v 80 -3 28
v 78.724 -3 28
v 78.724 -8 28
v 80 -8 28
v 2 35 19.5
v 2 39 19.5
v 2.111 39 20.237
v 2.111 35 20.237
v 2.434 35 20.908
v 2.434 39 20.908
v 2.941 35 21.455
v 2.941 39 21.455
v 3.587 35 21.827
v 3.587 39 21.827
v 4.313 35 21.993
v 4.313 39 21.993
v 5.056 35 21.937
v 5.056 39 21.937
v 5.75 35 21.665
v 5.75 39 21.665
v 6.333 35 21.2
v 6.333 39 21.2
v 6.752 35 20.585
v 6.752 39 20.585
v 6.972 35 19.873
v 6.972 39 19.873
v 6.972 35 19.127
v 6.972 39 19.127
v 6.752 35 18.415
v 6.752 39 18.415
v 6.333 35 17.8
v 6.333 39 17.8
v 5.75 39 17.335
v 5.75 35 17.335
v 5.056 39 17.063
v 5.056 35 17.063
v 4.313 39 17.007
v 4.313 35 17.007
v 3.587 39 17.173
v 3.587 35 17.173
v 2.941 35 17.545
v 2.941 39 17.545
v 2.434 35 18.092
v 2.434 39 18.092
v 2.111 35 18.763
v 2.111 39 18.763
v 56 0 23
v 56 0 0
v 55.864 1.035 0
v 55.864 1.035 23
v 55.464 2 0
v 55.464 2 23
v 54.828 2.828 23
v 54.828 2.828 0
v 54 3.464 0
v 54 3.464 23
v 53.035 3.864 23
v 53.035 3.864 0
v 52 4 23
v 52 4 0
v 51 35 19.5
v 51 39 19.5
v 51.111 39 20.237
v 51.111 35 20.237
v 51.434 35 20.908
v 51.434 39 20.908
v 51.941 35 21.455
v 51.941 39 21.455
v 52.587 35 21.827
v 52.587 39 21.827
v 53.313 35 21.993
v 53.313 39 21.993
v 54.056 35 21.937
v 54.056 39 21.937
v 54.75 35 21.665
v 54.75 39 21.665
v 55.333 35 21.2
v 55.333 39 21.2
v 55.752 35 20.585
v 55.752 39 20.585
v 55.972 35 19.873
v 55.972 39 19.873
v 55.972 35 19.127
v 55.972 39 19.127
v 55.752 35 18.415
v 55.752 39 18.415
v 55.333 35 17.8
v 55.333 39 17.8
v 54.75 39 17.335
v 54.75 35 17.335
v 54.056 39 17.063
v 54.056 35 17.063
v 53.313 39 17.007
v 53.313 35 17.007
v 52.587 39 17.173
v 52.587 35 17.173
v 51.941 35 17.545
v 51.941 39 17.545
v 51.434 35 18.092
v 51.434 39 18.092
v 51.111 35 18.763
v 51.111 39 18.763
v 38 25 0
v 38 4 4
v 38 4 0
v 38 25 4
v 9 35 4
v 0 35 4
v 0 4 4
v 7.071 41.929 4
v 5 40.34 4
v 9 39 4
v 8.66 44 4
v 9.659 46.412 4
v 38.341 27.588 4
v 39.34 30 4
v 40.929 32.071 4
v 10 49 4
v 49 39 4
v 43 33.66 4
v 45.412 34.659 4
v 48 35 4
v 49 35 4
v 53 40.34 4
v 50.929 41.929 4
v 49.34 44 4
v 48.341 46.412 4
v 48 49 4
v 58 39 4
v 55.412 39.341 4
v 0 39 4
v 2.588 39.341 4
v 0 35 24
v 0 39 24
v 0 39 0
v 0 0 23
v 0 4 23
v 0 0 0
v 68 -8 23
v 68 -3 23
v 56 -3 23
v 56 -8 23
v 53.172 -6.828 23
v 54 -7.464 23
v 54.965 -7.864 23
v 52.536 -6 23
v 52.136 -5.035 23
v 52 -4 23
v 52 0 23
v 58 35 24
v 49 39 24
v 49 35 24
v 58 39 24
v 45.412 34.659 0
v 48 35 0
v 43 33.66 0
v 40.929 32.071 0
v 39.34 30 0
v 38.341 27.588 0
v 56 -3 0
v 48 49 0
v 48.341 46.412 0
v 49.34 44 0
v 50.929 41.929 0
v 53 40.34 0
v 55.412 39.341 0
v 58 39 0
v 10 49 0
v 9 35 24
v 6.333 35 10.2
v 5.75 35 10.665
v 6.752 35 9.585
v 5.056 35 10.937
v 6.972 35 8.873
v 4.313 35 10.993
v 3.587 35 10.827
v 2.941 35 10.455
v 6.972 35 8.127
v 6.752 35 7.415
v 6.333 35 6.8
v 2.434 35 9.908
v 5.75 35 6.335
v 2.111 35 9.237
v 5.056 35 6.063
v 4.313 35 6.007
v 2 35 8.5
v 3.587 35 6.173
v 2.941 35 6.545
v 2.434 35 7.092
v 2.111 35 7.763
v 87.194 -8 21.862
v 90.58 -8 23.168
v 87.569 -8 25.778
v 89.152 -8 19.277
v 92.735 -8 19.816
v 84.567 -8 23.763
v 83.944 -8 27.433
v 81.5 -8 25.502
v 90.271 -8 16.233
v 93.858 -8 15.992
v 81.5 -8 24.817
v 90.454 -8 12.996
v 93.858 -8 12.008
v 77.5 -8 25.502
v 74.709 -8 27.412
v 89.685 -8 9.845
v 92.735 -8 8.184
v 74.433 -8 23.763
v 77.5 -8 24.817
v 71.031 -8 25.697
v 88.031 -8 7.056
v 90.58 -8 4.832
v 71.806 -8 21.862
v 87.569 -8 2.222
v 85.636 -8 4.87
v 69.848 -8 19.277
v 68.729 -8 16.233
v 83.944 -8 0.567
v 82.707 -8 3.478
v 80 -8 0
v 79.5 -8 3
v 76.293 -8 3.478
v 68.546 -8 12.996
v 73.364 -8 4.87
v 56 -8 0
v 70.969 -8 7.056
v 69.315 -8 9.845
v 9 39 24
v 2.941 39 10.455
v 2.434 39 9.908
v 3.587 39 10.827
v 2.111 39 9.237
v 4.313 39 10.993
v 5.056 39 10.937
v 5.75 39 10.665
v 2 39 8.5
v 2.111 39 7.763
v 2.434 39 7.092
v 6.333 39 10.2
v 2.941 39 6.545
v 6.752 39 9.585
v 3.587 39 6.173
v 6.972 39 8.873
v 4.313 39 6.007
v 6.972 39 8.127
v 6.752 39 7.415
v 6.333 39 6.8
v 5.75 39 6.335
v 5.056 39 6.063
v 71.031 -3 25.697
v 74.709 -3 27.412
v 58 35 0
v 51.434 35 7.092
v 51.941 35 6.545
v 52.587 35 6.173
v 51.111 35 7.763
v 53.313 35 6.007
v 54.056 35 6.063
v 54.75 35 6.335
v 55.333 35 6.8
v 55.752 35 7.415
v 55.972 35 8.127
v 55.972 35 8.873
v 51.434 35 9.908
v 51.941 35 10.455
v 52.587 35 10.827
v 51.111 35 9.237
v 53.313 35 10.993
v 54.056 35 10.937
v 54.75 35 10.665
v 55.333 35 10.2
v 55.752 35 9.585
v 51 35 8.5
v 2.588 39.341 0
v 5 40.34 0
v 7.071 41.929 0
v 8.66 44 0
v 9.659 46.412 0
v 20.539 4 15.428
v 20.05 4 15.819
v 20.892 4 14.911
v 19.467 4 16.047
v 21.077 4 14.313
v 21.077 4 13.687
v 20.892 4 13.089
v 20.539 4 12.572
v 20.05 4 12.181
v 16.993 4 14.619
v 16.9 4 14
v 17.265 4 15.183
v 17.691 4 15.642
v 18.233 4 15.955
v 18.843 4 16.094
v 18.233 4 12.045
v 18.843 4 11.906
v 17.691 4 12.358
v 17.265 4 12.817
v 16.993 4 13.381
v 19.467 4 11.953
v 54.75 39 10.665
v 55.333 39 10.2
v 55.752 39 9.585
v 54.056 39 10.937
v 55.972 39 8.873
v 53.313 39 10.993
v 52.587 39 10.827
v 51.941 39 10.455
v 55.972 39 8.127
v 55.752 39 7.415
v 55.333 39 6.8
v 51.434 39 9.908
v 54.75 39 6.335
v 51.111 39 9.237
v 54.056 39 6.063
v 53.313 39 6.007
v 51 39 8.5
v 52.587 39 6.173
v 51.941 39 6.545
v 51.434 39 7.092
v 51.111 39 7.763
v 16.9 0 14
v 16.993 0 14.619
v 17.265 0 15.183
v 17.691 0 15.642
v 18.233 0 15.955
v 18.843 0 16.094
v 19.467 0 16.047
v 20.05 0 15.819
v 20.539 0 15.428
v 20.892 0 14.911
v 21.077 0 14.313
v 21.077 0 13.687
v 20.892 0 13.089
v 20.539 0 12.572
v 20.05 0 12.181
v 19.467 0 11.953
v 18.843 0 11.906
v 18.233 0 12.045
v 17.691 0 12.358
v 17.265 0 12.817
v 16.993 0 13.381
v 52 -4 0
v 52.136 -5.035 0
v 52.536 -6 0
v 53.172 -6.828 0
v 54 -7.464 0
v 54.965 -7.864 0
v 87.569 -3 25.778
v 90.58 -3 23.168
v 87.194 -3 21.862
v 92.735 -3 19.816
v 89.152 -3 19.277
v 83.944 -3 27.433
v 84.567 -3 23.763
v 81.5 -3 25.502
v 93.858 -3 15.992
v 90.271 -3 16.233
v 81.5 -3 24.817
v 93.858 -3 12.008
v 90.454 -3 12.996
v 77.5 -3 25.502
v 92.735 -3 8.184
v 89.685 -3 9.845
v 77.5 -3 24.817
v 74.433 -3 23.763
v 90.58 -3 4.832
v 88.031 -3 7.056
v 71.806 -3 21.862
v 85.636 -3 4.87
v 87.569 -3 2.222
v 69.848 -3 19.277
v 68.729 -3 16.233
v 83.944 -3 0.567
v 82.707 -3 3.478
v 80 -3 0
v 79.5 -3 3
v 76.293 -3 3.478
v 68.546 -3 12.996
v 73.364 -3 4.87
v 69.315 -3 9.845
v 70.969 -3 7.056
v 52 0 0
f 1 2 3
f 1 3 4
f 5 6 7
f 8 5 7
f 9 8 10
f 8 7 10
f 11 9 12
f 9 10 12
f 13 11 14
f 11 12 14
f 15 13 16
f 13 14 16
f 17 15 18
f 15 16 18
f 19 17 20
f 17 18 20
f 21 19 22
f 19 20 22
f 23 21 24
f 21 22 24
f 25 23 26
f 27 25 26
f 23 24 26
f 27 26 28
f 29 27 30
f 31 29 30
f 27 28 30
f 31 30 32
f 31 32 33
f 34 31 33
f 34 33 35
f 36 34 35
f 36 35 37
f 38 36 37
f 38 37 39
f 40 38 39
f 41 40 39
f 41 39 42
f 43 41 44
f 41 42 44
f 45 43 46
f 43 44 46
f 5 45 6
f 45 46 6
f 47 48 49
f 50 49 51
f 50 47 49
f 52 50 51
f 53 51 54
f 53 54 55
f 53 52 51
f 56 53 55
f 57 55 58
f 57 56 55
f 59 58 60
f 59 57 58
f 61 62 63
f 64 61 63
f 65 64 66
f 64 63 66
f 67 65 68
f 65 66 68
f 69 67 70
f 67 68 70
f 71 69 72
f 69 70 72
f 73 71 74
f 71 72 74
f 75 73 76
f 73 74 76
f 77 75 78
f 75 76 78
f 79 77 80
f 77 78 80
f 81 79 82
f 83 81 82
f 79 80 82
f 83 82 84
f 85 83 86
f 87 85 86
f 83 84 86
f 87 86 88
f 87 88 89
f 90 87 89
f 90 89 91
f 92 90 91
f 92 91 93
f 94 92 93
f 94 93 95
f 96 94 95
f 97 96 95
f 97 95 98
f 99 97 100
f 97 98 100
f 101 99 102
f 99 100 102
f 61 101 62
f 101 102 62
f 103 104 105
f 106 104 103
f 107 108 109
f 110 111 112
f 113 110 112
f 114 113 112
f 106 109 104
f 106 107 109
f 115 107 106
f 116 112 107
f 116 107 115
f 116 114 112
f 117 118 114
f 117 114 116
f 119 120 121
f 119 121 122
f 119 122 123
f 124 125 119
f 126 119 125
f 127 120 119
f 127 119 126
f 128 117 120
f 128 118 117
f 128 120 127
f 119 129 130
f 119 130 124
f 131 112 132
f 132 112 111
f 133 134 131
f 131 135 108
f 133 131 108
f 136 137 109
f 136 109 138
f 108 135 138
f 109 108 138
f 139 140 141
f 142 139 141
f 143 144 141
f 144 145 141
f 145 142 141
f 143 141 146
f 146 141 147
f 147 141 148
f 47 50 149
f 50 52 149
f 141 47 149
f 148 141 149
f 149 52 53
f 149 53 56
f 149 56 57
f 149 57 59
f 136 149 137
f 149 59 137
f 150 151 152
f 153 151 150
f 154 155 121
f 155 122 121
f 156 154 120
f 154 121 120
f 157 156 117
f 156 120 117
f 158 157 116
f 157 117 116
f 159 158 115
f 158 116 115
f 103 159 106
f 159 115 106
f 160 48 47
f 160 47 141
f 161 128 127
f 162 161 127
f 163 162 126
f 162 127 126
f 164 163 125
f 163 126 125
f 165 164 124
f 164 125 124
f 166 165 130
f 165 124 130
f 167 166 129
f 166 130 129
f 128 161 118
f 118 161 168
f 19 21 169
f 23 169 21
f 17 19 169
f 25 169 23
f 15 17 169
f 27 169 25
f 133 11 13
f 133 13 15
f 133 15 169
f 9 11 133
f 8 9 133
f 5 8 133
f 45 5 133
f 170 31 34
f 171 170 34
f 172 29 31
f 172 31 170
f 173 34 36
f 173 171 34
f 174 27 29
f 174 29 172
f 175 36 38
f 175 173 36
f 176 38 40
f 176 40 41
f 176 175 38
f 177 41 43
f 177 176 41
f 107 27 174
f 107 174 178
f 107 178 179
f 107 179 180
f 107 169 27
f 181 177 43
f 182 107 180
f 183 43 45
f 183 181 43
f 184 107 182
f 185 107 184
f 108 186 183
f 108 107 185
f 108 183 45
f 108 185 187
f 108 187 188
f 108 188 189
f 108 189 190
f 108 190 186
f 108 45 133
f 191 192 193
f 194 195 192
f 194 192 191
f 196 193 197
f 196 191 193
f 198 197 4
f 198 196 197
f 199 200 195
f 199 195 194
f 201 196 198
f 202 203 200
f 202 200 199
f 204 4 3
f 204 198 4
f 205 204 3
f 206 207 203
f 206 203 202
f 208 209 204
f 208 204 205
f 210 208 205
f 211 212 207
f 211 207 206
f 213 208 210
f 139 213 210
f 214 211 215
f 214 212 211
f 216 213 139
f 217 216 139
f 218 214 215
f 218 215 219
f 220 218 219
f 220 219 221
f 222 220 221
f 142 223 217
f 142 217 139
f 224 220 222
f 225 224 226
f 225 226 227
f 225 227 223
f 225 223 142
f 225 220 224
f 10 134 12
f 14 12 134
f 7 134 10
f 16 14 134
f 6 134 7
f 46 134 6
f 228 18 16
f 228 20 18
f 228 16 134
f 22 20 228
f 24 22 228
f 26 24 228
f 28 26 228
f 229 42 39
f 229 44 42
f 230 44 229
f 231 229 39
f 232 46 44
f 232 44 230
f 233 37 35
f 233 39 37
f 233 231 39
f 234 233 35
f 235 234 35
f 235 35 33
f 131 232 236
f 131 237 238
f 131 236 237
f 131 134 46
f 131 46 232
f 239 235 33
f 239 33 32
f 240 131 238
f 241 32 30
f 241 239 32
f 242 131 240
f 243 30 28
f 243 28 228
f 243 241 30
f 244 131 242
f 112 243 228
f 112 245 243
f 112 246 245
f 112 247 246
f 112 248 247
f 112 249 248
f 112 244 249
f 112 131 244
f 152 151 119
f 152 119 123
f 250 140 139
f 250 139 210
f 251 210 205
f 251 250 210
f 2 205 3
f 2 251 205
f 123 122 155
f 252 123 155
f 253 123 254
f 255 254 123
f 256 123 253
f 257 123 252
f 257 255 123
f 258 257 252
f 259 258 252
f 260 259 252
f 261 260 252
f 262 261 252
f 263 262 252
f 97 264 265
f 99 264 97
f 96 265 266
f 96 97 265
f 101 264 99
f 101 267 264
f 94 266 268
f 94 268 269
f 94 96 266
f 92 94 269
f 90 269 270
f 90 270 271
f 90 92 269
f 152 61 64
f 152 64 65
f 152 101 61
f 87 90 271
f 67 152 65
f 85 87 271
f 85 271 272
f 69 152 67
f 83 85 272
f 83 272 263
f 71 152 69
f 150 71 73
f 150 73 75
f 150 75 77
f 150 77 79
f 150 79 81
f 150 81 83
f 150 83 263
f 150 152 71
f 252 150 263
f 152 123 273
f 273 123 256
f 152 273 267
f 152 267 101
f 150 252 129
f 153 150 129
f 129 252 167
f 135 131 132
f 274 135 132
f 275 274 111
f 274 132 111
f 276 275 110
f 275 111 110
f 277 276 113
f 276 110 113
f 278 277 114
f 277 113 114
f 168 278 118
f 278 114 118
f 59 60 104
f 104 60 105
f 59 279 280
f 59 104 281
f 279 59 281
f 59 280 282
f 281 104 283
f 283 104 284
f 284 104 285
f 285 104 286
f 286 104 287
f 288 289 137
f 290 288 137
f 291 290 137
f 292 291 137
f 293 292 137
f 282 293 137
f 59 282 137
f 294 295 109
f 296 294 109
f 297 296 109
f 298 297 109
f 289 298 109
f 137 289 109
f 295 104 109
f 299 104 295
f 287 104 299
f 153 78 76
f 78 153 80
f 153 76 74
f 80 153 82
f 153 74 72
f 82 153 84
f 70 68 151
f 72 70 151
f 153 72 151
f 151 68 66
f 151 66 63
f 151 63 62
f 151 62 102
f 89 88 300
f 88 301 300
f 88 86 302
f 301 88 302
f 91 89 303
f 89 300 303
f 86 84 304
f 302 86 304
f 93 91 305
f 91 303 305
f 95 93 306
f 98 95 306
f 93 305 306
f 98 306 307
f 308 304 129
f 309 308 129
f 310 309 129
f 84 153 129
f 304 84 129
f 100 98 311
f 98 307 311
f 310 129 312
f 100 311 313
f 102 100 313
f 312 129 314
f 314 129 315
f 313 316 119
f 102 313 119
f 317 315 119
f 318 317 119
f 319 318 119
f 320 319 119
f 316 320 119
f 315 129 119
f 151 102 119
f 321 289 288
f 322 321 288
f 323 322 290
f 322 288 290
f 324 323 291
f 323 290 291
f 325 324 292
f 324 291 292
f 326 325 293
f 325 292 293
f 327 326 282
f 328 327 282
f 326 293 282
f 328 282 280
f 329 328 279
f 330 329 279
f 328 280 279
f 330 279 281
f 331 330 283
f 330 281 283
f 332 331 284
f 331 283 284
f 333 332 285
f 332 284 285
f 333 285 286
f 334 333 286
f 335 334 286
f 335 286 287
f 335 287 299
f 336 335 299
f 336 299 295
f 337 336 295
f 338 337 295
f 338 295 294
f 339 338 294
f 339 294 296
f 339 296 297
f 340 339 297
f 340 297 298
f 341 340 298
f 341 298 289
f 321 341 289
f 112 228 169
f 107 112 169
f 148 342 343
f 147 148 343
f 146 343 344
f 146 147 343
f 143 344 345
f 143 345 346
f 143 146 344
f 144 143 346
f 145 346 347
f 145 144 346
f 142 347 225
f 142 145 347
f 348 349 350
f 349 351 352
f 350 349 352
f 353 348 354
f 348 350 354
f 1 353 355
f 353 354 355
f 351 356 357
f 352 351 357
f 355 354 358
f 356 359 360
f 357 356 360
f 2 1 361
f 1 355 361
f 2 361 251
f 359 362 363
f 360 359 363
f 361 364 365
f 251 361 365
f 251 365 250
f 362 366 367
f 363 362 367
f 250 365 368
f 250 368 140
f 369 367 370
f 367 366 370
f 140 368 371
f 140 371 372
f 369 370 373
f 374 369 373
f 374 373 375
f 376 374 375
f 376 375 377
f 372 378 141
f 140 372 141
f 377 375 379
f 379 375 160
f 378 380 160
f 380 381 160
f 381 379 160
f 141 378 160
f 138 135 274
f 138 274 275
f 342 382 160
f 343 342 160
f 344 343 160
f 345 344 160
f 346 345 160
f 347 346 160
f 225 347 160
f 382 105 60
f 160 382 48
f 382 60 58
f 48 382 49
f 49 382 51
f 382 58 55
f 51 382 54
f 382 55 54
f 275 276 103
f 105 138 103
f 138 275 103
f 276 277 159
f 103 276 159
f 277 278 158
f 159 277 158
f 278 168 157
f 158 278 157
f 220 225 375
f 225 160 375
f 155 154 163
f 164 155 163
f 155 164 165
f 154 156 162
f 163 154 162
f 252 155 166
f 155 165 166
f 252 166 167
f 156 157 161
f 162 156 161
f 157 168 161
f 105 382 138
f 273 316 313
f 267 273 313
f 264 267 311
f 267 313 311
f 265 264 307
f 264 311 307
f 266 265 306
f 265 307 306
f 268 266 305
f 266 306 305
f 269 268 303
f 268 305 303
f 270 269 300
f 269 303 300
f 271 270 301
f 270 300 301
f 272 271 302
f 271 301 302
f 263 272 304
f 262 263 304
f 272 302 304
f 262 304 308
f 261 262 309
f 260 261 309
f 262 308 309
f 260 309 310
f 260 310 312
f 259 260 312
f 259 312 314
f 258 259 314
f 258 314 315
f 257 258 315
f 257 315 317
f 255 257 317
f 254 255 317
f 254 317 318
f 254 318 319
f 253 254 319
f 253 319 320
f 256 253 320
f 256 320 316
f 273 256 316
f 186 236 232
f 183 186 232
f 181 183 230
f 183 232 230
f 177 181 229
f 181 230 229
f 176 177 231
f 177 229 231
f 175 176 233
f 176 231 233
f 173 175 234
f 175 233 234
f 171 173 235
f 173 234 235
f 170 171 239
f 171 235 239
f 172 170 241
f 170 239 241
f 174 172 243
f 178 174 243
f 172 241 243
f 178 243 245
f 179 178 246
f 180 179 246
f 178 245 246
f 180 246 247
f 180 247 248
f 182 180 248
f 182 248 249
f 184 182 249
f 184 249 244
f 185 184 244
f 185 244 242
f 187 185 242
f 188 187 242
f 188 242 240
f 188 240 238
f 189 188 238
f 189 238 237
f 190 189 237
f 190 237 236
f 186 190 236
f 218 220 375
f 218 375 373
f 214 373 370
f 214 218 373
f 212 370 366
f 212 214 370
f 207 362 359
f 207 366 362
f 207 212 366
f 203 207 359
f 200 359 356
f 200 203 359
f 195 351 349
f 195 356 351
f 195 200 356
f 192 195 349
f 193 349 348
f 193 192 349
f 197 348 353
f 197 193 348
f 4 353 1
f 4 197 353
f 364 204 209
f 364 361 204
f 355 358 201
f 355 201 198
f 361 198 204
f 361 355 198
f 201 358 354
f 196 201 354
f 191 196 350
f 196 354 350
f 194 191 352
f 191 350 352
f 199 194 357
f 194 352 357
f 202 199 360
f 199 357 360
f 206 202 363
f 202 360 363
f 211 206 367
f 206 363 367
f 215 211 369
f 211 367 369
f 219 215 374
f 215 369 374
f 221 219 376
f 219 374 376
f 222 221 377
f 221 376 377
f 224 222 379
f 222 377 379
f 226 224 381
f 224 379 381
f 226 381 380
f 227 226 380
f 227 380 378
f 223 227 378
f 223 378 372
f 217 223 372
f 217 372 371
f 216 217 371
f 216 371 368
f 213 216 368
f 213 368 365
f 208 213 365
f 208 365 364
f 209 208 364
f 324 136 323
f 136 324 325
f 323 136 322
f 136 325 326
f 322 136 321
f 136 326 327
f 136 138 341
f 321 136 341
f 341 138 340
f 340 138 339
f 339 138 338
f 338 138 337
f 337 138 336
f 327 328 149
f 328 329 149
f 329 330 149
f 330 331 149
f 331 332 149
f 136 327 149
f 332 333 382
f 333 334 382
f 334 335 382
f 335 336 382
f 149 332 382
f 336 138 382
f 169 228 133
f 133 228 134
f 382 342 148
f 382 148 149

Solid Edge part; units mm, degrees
sketch "Sketch1" plane through (0, 0, 0) normal (0, 0, 1) x (1, 0, 0)
  line L0 (58, 49) -> (0, 49)
  line L1 (0, 49) -> (0, 0)
  line L2 (0, 0) -> (58, 0)
  line L3 (58, 0) -> (58, 49)
extrude "Protrusion1" add sketch "Sketch1" along normal blind 4
sketch "Sketch2" plane through (29, 24.5, 4) normal (0, 0, 1) x (1, 0, 0)
  circle A0 centre (-29, 24.5) radius 10
  circle A1 centre (29, 24.5) radius 10
  dimension "D1" = 20
extrude "Cutout1" cut sketch "Sketch2" against normal through all
sketch "Sketch3" plane through (29, 24.5, 4) normal (0, 0, 1) x (1, 0, 0)
  line L0 (-20, 10.5) -> (-29, 10.5)
  line L1 (-29, 10.5) -> (-29, 14.5)
  line L2 (-29, 14.5) -> (-20, 14.5)
  line L3 (-20, 14.5) -> (-20, 10.5)
  line L4 (20, 10.5) -> (29, 10.5)
  line L5 (29, 10.5) -> (29, 14.5)
  line L6 (29, 14.5) -> (20, 14.5)
  line L7 (20, 14.5) -> (20, 10.5)
  dimension "D1" = 4
  dimension "D2" = 9
extrude "ExtrudedProtrusion_2" add sketch "Sketch3" along normal blind 20
sketch "Sketch4" plane through (29, 24.5, 4) normal (0, 0, 1) x (1, 0, 0)
  line L0 (19, 10.5) -> (29, 10.5)
  line L1 (29, 10.5) -> (29, 0.5)
  line L2 (29, 0.5) -> (29, -24.5)
  line L3 (29, -24.5) -> (9, -24.5)
  line L4 (9, -24.5) -> (9, 0.5)
  arc A0 (9, 0.5) -> (19, 10.5) centre (19, 0.5) cw
extrude "Cutout2" cut sketch "Sketch4" against normal through all
sketch "Sketch5" plane through (0, 0, 0) normal (0, 0, 1) x (1, 0, 0)
  line L0 (52, -8) -> (52, 0)
  line L1 (0, 0) -> (52, 0)
  line L2 (0, 4) -> (0, 0)
  line L3 (52, 4) -> (0, 4)
  line L4 (52, 4) -> (56, 4)
  line L5 (56, 4) -> (56, -3)
  line L6 (94, -3) -> (56, -3)
  line L7 (94, -8) -> (94, -3)
  line L8 (56, -8) -> (94, -8)
  line L9 (56, -8) -> (52, -8)
extrude "ExtrudedProtrusion_3" add sketch "Sketch5" along normal blind 23
sketch "Sketch6" plane through (4.5, 39, 13.5) normal (0, 1, 0) x (-1, 0, 0)
  circle A0 centre (-49, 6) radius 2.5
  circle A1 centre (-49, -5) radius 2.5
  circle A2 centre (0, 6) radius 2.5
  circle A3 centre (0, -5) radius 2.5
  dimension "D1" = 5
  dimension "D2" = 4.5
  dimension "D3" = 15.5
extrude "Cutout3" cut sketch "Sketch6" against normal up to next
sketch "Sketch7" plane through (28, 4, 11.5) normal (0, 1, 0) x (-1, 0, 0)
  circle A0 centre (9, 2.5) radius 2.1
extrude "Cutout4" cut sketch "Sketch7" against normal up to next
fillet "Round_1" radius 4 2 edges at (56, 4, 11.5) (52, -8, 11.5)
sketch "Sketch8" plane through (47, -2, 23) normal (0, 0, 1) x (-1, 0, 0)
  line L0 (-47, 1) -> (-21, 1)
  line L1 (-21, 1) -> (-21, 6)
  line L2 (-21, 6) -> (-47, 6)
  line L3 (-47, 6) -> (-47, 1)
extrude "ExtrudedProtrusion_4" add sketch "Sketch8" along normal blind 5
fillet "Round_2" radius 14 3 edges at (94, -5.5, 28) (94, -5.5, 0) (68, -5.5, 28)
sketch "Sketch9" plane through (72, -3, 11.5) normal (0, 1, 0) x (0, 0, -1)
  circle A0 centre (-2.5, -7.5) radius 11
extrude "Cutout5" cut sketch "Sketch9" against normal up to next
sketch "Sketch10" plane through (75, -3, 14) normal (0, 1, 0) x (-1, 0, 0)
  line L0 (-2.5, 10.4979) -> (-6.5, 10.4979)
  line L1 (-6.5, 10.4979) -> (-6.5, 11.5021)
  line L2 (-6.5, 11.5021) -> (-2.5, 11.5021)
  line L3 (-2.5, 11.5021) -> (-2.5, 10.4979)
extrude "Cutout6" cut sketch "Sketch10" against normal through all
